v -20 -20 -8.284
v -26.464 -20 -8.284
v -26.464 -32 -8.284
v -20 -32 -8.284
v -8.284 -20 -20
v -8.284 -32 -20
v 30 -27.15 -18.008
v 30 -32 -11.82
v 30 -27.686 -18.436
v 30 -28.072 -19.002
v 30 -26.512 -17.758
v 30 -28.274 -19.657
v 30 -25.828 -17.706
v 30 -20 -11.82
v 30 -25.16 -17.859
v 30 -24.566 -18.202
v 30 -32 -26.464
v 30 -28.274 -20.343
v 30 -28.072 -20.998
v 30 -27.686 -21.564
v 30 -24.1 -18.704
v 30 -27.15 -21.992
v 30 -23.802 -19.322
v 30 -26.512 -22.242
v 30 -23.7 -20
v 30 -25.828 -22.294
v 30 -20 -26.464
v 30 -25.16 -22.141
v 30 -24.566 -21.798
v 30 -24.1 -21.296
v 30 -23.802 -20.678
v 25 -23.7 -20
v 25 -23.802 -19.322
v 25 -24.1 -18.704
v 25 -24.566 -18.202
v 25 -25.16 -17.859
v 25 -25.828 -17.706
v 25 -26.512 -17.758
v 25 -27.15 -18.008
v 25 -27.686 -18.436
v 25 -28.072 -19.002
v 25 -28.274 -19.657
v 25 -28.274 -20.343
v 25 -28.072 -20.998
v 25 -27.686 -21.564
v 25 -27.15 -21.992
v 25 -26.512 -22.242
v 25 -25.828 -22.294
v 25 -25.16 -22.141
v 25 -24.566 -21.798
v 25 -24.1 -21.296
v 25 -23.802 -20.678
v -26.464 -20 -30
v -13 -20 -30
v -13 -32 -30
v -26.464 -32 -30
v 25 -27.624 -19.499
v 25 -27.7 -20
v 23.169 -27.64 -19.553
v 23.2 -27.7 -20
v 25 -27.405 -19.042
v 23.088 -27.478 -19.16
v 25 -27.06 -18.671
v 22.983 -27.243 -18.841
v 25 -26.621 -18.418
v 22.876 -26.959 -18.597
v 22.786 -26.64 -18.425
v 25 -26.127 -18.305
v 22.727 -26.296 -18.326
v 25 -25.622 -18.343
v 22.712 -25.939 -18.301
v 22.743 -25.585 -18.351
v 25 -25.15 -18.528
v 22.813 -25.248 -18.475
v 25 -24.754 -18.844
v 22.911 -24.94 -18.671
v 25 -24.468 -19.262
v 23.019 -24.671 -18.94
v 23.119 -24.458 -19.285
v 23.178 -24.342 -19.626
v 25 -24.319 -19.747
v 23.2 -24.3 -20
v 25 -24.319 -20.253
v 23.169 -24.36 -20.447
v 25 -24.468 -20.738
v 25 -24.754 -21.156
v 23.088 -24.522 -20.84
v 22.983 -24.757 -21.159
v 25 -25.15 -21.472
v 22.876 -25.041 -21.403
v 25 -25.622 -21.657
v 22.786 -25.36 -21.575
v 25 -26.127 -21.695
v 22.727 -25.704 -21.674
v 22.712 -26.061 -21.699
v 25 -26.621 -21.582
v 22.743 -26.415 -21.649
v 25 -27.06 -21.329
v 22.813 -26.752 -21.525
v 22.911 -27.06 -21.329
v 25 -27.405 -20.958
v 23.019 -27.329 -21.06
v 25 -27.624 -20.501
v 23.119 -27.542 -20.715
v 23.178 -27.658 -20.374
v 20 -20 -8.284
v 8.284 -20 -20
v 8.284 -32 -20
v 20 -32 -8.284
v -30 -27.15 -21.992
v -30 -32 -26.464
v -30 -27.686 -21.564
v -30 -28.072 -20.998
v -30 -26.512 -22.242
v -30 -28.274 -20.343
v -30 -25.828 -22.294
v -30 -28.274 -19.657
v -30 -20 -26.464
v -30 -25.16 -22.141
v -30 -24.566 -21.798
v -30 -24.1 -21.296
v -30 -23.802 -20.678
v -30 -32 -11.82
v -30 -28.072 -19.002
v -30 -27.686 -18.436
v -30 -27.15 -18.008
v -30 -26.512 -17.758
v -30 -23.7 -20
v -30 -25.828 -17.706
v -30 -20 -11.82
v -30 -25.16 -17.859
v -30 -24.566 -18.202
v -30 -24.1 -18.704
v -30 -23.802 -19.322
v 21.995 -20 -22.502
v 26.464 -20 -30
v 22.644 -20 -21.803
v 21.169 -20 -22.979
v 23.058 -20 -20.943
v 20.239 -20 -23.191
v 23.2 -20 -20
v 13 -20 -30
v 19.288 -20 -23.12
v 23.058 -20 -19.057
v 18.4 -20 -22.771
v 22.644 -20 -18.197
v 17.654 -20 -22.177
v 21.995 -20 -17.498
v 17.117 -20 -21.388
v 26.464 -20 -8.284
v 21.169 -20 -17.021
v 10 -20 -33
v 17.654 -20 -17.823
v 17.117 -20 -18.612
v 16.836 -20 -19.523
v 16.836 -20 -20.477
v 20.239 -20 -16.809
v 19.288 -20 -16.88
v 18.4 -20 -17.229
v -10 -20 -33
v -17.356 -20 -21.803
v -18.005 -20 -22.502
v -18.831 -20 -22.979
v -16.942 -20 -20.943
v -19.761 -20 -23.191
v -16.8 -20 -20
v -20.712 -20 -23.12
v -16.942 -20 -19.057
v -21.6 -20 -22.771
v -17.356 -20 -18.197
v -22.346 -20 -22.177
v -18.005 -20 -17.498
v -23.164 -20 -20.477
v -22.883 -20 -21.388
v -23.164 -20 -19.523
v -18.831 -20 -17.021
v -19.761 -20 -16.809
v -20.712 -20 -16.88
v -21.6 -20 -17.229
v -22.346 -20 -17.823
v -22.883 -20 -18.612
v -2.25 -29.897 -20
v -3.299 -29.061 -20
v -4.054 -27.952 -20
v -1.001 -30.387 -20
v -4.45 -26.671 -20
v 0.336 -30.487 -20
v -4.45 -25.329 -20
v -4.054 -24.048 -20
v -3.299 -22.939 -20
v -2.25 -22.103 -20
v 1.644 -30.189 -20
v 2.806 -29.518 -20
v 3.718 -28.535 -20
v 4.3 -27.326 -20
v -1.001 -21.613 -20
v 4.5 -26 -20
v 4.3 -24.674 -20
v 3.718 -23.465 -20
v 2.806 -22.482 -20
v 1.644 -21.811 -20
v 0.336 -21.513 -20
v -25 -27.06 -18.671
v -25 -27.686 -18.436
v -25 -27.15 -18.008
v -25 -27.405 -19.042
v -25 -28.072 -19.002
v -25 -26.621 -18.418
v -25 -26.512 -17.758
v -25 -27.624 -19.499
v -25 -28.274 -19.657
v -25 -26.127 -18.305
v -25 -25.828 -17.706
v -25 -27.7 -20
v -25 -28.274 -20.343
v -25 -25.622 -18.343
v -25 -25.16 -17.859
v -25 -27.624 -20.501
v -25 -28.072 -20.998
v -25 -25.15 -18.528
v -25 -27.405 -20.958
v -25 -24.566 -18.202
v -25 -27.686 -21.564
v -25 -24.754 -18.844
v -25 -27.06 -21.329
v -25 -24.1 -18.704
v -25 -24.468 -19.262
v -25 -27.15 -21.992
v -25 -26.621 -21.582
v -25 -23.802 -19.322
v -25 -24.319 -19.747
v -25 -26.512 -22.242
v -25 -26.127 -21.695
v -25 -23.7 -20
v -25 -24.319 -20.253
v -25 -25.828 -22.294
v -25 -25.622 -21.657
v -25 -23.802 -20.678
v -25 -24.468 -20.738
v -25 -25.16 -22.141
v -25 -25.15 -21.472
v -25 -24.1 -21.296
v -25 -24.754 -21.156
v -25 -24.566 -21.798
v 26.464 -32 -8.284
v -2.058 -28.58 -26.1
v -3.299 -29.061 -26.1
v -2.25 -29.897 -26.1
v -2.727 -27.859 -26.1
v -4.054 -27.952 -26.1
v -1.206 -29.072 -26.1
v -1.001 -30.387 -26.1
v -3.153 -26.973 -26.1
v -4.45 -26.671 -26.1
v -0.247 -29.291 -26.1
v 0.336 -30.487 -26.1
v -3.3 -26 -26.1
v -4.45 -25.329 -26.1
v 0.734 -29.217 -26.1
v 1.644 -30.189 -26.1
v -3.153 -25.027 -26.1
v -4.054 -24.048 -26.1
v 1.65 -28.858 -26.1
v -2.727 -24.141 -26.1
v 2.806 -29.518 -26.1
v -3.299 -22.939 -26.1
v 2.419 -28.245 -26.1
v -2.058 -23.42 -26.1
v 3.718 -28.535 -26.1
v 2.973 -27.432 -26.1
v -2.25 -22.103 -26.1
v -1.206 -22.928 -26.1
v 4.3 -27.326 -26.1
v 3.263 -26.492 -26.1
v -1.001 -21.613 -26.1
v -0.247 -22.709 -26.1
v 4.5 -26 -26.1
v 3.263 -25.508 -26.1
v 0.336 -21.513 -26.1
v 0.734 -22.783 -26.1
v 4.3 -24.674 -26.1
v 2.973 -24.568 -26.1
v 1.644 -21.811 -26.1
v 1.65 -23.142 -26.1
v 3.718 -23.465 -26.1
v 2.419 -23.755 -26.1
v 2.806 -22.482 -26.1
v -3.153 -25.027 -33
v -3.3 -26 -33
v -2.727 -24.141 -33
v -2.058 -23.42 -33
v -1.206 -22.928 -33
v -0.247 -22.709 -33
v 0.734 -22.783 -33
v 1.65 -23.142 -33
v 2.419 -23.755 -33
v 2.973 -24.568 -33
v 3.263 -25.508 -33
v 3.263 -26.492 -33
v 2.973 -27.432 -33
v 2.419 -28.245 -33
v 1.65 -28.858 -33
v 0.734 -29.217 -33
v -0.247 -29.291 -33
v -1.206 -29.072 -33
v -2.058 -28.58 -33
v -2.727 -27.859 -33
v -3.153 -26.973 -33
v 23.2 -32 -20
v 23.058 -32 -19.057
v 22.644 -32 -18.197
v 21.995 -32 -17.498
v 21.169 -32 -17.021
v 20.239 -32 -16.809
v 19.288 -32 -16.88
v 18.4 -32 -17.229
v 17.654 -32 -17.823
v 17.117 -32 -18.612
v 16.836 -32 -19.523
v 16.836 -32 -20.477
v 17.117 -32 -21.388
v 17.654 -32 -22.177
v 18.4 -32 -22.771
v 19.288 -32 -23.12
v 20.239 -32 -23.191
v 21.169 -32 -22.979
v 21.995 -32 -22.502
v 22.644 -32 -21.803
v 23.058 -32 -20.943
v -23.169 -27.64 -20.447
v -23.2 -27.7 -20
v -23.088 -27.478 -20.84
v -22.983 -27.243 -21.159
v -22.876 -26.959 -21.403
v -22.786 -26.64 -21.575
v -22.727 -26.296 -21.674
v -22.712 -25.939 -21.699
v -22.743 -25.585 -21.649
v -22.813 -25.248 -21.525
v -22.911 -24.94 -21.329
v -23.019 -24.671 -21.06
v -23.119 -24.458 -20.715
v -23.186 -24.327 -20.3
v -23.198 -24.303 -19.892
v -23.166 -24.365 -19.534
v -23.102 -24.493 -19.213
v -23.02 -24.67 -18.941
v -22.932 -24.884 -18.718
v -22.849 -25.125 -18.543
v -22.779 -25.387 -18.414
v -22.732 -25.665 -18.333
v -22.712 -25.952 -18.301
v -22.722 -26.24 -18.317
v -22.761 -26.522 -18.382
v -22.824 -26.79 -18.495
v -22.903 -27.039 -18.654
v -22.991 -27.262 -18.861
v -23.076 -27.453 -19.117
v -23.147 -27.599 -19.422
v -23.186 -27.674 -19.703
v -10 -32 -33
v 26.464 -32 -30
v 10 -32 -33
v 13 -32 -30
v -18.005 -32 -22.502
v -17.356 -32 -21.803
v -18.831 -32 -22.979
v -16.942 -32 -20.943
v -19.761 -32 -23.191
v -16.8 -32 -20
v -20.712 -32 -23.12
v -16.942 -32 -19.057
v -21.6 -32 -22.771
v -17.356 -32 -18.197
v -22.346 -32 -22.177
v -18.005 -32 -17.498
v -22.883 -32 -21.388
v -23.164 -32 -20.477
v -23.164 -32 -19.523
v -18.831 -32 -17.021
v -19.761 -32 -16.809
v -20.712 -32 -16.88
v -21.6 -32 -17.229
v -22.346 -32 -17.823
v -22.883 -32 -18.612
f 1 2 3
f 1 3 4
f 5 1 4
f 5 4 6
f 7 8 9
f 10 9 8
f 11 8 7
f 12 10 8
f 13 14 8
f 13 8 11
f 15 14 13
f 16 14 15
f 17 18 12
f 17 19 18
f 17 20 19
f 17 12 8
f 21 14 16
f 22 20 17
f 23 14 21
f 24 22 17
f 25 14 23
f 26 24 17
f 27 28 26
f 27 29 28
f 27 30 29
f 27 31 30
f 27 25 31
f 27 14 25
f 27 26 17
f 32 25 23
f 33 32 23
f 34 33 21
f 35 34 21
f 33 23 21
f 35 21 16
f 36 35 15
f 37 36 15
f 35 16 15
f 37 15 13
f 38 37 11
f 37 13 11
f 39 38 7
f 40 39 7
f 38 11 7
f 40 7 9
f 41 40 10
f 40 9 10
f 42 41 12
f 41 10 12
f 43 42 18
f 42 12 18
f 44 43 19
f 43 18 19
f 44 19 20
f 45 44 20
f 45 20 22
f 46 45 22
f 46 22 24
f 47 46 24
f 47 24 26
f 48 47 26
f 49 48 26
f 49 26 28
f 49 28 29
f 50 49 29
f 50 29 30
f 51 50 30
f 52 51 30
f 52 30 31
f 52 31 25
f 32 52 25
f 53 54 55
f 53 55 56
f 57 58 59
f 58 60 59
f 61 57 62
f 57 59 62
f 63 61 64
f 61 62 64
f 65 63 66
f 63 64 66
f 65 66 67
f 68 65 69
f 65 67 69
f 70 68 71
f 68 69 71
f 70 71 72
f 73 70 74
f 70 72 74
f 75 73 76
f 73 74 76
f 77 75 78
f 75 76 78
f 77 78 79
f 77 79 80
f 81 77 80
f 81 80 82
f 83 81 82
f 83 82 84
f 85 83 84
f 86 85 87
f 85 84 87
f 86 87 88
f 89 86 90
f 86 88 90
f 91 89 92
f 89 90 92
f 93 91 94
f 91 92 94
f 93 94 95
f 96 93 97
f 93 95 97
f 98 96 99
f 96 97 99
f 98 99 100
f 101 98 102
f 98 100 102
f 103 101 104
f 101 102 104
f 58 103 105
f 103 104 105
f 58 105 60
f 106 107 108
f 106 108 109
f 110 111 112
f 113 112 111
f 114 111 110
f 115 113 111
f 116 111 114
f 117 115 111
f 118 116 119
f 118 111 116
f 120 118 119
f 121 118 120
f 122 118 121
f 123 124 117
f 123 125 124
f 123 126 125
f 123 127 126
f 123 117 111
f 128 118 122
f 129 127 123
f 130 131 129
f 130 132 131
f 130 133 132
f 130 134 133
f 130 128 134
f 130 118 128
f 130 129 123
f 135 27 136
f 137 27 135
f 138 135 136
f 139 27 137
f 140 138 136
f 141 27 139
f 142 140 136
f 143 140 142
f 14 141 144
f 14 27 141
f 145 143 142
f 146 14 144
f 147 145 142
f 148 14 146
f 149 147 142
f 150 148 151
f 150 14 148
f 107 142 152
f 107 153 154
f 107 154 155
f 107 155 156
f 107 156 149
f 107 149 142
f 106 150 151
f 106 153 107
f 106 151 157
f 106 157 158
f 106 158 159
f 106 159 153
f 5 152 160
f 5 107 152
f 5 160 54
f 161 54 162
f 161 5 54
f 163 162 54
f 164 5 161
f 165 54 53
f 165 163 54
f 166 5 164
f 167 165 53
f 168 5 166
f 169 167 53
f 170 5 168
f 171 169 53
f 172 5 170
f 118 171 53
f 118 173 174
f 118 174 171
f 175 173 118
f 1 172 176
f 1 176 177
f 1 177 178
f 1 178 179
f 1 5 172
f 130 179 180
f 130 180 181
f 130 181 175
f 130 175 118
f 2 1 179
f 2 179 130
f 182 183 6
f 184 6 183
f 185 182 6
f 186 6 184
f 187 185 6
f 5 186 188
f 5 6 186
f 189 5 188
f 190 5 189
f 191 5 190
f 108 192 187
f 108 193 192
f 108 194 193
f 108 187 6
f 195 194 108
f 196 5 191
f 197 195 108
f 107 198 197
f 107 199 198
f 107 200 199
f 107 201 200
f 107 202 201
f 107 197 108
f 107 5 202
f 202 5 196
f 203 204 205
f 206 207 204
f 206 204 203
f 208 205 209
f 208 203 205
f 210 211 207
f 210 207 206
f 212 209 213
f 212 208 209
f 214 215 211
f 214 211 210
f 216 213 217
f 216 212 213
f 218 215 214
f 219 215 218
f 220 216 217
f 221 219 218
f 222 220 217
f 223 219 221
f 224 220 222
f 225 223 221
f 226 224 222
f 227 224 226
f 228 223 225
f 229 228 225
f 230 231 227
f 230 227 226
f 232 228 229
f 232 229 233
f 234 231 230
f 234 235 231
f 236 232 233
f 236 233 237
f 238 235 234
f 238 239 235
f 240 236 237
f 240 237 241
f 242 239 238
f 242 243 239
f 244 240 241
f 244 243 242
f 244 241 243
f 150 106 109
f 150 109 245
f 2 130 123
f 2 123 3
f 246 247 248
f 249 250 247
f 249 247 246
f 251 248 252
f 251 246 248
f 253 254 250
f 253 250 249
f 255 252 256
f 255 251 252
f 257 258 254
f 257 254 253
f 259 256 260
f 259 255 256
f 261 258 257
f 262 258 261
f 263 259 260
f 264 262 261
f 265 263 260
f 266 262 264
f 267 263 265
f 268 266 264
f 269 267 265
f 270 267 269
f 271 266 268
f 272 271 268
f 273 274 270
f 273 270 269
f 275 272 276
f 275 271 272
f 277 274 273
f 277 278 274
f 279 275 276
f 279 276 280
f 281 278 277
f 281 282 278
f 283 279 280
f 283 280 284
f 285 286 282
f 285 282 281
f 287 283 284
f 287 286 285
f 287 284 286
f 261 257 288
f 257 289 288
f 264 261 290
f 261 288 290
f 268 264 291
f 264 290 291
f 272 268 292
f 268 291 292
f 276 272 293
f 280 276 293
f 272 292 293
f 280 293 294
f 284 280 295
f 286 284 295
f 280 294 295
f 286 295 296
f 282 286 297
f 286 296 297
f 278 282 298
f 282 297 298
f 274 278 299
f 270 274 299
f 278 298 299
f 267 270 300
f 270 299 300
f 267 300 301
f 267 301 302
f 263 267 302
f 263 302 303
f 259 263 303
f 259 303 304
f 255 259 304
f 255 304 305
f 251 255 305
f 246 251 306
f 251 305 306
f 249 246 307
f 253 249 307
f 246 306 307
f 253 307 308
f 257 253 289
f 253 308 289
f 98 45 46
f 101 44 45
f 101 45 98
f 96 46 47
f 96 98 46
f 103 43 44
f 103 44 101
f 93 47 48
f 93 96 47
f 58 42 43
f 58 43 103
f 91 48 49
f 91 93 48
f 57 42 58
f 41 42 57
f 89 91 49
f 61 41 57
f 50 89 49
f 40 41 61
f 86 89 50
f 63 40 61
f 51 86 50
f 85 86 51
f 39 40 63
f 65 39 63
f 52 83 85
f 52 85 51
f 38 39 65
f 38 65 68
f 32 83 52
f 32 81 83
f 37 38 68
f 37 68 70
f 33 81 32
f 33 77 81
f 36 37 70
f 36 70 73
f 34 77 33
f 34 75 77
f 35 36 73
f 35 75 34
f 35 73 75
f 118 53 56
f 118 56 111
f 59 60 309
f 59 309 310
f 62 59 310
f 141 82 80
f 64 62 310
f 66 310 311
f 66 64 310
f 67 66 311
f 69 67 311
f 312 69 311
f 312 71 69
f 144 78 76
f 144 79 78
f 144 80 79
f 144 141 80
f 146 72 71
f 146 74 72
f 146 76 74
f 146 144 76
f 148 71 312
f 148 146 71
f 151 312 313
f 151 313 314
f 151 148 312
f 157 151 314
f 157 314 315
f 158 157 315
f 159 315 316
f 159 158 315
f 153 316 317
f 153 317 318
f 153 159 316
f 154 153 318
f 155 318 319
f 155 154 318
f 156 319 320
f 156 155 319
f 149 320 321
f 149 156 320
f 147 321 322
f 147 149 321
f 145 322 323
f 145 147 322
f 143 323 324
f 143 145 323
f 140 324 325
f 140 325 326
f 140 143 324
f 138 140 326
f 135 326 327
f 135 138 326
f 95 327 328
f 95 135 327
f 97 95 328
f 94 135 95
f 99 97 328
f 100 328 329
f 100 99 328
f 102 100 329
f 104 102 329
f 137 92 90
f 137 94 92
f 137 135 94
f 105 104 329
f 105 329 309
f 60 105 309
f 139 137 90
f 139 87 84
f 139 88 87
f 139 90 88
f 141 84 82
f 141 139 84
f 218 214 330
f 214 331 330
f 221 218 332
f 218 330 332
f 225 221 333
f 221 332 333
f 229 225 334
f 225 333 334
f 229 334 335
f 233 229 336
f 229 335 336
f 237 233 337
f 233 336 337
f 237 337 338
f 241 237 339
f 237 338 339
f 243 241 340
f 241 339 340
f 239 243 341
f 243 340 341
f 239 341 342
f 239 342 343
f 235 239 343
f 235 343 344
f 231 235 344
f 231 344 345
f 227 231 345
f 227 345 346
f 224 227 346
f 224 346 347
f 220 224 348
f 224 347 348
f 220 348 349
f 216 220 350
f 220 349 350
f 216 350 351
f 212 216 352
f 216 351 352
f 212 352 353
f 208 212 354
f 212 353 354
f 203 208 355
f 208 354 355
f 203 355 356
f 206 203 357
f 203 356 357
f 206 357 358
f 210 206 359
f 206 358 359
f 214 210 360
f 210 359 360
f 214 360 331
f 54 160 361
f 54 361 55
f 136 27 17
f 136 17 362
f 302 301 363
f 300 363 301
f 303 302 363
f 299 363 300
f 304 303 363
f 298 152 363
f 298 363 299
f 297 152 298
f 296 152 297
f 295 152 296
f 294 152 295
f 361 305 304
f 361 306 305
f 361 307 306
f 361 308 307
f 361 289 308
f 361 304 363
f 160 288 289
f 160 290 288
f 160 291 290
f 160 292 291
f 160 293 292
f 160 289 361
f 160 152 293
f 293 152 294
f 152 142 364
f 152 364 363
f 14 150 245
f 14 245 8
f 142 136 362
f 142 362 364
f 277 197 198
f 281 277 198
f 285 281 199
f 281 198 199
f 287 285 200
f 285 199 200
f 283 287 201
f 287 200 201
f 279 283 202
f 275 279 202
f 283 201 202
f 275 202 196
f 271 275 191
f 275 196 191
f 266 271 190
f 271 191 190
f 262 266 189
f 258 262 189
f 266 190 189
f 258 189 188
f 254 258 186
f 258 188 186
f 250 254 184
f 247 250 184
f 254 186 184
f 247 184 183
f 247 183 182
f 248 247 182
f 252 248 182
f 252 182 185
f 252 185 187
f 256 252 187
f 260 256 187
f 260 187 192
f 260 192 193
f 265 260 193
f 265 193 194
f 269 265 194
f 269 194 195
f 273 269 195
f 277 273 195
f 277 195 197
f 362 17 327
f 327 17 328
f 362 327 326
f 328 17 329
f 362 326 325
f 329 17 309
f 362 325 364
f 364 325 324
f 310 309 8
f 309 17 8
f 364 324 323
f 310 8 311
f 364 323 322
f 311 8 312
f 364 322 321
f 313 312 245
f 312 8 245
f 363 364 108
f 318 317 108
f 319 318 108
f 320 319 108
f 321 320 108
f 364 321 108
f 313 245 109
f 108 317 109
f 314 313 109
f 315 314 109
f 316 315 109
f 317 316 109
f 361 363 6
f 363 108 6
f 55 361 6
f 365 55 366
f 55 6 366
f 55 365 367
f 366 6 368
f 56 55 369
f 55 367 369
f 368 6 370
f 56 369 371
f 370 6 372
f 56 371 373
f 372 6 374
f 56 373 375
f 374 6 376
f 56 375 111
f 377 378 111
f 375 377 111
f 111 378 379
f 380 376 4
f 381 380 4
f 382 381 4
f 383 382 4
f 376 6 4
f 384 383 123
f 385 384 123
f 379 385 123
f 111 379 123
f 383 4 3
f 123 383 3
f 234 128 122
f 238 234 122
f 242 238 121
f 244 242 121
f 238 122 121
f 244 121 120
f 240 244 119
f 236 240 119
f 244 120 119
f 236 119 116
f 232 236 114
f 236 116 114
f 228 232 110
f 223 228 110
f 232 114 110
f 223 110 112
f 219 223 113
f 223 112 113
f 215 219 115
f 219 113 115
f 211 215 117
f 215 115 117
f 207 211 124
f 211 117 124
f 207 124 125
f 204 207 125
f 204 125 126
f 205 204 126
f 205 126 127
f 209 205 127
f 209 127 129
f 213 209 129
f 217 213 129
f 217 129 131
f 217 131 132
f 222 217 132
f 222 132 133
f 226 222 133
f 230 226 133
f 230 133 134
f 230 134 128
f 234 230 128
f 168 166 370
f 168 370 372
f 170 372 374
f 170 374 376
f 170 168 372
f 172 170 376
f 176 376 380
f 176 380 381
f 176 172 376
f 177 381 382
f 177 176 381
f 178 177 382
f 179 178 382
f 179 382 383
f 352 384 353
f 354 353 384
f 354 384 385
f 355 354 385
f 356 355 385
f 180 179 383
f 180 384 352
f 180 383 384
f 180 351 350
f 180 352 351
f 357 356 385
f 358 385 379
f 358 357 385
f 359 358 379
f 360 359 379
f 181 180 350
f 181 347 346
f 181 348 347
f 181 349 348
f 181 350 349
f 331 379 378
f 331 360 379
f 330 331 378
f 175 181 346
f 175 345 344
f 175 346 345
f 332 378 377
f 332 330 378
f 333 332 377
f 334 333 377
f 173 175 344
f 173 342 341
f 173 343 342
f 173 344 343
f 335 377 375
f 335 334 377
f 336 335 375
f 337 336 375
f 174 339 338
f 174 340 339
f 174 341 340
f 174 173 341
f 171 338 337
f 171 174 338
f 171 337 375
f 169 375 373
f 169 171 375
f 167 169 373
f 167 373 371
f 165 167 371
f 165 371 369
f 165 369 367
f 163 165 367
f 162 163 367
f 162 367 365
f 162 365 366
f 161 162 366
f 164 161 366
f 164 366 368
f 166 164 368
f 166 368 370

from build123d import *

# Parameters (mm, degrees)
SKETCH010_R         = 3.2
PAD003_DEPTH        = 12
HOLE004_D           = 6.6
HOLE004_DEPTH       = 25
HOLE004_CBORE_D     = 9
HOLE004_CBORE_DEPTH = 6.1
HOLE005_D           = 3.4
HOLE005_DEPTH       = 10
HOLE005_CBORE_D     = 4.6
HOLE005_CBORE_DEPTH = 5
HOLE005_TIPS_R      = 1.7
HOLE006_D           = 3.4
HOLE006_DEPTH       = 10
HOLE006_CBORE_D     = 4.6
HOLE006_CBORE_DEPTH = 5


with BuildPart() as part:
    # Sketch010 (on DatumPlane) → Pad003 (new body)
    with BuildSketch(Plane.XZ.offset(20)):
        Polygon((30, -11.819805), (30, -26.464466), (26.464466, -30), (13, -30), (10, -33), (-10, -33), (-13, -30), (-26.464466, -30), (-30, -26.464466), (-30, -11.819805), (-26.464466, -8.284271), (-20, -8.284271), (-8.284271, -20), (8.284271, -20), (20, -8.284271), (26.464466, -8.284271), align=None)
        with Locations((20, -20)):
            Circle(SKETCH010_R, mode=Mode.SUBTRACT)
        with Locations((-20, -20)):
            Circle(SKETCH010_R, mode=Mode.SUBTRACT)
    extrude(amount=PAD003_DEPTH)

    # Hole004
    with Locations(Plane.XY.offset(-20)):
        with Locations((0, -26)):
            CounterBoreHole(HOLE004_D / 2, HOLE004_CBORE_D / 2, HOLE004_CBORE_DEPTH, depth=HOLE004_DEPTH)

    # Hole005
    with Locations(Plane.YZ.offset(30)):
        with Locations((-26, -20)):
            CounterBoreHole(HOLE005_D / 2, HOLE005_CBORE_D / 2, HOLE005_CBORE_DEPTH, depth=HOLE005_DEPTH)

    # Hole005 tips → Hole005 tip 1 section 0
    with BuildSketch(Plane.YZ.offset(20), mode=Mode.PRIVATE) as hole005_tip_1_s0:
        with Locations((-26, -20)):
            Circle(HOLE005_TIPS_R)
    loft([hole005_tip_1_s0.sketch, Vertex(18.978537, -26, -20)], mode=Mode.SUBTRACT)

    # Hole006
    with Locations(Plane(origin=(-30, 0, 0), x_dir=(0, 1, 0), z_dir=(-1, 0, 0))):
        with Locations((-26, 20)):
            CounterBoreHole(HOLE006_D / 2, HOLE006_CBORE_D / 2, HOLE006_CBORE_DEPTH, depth=HOLE006_DEPTH)


solid = part.part
